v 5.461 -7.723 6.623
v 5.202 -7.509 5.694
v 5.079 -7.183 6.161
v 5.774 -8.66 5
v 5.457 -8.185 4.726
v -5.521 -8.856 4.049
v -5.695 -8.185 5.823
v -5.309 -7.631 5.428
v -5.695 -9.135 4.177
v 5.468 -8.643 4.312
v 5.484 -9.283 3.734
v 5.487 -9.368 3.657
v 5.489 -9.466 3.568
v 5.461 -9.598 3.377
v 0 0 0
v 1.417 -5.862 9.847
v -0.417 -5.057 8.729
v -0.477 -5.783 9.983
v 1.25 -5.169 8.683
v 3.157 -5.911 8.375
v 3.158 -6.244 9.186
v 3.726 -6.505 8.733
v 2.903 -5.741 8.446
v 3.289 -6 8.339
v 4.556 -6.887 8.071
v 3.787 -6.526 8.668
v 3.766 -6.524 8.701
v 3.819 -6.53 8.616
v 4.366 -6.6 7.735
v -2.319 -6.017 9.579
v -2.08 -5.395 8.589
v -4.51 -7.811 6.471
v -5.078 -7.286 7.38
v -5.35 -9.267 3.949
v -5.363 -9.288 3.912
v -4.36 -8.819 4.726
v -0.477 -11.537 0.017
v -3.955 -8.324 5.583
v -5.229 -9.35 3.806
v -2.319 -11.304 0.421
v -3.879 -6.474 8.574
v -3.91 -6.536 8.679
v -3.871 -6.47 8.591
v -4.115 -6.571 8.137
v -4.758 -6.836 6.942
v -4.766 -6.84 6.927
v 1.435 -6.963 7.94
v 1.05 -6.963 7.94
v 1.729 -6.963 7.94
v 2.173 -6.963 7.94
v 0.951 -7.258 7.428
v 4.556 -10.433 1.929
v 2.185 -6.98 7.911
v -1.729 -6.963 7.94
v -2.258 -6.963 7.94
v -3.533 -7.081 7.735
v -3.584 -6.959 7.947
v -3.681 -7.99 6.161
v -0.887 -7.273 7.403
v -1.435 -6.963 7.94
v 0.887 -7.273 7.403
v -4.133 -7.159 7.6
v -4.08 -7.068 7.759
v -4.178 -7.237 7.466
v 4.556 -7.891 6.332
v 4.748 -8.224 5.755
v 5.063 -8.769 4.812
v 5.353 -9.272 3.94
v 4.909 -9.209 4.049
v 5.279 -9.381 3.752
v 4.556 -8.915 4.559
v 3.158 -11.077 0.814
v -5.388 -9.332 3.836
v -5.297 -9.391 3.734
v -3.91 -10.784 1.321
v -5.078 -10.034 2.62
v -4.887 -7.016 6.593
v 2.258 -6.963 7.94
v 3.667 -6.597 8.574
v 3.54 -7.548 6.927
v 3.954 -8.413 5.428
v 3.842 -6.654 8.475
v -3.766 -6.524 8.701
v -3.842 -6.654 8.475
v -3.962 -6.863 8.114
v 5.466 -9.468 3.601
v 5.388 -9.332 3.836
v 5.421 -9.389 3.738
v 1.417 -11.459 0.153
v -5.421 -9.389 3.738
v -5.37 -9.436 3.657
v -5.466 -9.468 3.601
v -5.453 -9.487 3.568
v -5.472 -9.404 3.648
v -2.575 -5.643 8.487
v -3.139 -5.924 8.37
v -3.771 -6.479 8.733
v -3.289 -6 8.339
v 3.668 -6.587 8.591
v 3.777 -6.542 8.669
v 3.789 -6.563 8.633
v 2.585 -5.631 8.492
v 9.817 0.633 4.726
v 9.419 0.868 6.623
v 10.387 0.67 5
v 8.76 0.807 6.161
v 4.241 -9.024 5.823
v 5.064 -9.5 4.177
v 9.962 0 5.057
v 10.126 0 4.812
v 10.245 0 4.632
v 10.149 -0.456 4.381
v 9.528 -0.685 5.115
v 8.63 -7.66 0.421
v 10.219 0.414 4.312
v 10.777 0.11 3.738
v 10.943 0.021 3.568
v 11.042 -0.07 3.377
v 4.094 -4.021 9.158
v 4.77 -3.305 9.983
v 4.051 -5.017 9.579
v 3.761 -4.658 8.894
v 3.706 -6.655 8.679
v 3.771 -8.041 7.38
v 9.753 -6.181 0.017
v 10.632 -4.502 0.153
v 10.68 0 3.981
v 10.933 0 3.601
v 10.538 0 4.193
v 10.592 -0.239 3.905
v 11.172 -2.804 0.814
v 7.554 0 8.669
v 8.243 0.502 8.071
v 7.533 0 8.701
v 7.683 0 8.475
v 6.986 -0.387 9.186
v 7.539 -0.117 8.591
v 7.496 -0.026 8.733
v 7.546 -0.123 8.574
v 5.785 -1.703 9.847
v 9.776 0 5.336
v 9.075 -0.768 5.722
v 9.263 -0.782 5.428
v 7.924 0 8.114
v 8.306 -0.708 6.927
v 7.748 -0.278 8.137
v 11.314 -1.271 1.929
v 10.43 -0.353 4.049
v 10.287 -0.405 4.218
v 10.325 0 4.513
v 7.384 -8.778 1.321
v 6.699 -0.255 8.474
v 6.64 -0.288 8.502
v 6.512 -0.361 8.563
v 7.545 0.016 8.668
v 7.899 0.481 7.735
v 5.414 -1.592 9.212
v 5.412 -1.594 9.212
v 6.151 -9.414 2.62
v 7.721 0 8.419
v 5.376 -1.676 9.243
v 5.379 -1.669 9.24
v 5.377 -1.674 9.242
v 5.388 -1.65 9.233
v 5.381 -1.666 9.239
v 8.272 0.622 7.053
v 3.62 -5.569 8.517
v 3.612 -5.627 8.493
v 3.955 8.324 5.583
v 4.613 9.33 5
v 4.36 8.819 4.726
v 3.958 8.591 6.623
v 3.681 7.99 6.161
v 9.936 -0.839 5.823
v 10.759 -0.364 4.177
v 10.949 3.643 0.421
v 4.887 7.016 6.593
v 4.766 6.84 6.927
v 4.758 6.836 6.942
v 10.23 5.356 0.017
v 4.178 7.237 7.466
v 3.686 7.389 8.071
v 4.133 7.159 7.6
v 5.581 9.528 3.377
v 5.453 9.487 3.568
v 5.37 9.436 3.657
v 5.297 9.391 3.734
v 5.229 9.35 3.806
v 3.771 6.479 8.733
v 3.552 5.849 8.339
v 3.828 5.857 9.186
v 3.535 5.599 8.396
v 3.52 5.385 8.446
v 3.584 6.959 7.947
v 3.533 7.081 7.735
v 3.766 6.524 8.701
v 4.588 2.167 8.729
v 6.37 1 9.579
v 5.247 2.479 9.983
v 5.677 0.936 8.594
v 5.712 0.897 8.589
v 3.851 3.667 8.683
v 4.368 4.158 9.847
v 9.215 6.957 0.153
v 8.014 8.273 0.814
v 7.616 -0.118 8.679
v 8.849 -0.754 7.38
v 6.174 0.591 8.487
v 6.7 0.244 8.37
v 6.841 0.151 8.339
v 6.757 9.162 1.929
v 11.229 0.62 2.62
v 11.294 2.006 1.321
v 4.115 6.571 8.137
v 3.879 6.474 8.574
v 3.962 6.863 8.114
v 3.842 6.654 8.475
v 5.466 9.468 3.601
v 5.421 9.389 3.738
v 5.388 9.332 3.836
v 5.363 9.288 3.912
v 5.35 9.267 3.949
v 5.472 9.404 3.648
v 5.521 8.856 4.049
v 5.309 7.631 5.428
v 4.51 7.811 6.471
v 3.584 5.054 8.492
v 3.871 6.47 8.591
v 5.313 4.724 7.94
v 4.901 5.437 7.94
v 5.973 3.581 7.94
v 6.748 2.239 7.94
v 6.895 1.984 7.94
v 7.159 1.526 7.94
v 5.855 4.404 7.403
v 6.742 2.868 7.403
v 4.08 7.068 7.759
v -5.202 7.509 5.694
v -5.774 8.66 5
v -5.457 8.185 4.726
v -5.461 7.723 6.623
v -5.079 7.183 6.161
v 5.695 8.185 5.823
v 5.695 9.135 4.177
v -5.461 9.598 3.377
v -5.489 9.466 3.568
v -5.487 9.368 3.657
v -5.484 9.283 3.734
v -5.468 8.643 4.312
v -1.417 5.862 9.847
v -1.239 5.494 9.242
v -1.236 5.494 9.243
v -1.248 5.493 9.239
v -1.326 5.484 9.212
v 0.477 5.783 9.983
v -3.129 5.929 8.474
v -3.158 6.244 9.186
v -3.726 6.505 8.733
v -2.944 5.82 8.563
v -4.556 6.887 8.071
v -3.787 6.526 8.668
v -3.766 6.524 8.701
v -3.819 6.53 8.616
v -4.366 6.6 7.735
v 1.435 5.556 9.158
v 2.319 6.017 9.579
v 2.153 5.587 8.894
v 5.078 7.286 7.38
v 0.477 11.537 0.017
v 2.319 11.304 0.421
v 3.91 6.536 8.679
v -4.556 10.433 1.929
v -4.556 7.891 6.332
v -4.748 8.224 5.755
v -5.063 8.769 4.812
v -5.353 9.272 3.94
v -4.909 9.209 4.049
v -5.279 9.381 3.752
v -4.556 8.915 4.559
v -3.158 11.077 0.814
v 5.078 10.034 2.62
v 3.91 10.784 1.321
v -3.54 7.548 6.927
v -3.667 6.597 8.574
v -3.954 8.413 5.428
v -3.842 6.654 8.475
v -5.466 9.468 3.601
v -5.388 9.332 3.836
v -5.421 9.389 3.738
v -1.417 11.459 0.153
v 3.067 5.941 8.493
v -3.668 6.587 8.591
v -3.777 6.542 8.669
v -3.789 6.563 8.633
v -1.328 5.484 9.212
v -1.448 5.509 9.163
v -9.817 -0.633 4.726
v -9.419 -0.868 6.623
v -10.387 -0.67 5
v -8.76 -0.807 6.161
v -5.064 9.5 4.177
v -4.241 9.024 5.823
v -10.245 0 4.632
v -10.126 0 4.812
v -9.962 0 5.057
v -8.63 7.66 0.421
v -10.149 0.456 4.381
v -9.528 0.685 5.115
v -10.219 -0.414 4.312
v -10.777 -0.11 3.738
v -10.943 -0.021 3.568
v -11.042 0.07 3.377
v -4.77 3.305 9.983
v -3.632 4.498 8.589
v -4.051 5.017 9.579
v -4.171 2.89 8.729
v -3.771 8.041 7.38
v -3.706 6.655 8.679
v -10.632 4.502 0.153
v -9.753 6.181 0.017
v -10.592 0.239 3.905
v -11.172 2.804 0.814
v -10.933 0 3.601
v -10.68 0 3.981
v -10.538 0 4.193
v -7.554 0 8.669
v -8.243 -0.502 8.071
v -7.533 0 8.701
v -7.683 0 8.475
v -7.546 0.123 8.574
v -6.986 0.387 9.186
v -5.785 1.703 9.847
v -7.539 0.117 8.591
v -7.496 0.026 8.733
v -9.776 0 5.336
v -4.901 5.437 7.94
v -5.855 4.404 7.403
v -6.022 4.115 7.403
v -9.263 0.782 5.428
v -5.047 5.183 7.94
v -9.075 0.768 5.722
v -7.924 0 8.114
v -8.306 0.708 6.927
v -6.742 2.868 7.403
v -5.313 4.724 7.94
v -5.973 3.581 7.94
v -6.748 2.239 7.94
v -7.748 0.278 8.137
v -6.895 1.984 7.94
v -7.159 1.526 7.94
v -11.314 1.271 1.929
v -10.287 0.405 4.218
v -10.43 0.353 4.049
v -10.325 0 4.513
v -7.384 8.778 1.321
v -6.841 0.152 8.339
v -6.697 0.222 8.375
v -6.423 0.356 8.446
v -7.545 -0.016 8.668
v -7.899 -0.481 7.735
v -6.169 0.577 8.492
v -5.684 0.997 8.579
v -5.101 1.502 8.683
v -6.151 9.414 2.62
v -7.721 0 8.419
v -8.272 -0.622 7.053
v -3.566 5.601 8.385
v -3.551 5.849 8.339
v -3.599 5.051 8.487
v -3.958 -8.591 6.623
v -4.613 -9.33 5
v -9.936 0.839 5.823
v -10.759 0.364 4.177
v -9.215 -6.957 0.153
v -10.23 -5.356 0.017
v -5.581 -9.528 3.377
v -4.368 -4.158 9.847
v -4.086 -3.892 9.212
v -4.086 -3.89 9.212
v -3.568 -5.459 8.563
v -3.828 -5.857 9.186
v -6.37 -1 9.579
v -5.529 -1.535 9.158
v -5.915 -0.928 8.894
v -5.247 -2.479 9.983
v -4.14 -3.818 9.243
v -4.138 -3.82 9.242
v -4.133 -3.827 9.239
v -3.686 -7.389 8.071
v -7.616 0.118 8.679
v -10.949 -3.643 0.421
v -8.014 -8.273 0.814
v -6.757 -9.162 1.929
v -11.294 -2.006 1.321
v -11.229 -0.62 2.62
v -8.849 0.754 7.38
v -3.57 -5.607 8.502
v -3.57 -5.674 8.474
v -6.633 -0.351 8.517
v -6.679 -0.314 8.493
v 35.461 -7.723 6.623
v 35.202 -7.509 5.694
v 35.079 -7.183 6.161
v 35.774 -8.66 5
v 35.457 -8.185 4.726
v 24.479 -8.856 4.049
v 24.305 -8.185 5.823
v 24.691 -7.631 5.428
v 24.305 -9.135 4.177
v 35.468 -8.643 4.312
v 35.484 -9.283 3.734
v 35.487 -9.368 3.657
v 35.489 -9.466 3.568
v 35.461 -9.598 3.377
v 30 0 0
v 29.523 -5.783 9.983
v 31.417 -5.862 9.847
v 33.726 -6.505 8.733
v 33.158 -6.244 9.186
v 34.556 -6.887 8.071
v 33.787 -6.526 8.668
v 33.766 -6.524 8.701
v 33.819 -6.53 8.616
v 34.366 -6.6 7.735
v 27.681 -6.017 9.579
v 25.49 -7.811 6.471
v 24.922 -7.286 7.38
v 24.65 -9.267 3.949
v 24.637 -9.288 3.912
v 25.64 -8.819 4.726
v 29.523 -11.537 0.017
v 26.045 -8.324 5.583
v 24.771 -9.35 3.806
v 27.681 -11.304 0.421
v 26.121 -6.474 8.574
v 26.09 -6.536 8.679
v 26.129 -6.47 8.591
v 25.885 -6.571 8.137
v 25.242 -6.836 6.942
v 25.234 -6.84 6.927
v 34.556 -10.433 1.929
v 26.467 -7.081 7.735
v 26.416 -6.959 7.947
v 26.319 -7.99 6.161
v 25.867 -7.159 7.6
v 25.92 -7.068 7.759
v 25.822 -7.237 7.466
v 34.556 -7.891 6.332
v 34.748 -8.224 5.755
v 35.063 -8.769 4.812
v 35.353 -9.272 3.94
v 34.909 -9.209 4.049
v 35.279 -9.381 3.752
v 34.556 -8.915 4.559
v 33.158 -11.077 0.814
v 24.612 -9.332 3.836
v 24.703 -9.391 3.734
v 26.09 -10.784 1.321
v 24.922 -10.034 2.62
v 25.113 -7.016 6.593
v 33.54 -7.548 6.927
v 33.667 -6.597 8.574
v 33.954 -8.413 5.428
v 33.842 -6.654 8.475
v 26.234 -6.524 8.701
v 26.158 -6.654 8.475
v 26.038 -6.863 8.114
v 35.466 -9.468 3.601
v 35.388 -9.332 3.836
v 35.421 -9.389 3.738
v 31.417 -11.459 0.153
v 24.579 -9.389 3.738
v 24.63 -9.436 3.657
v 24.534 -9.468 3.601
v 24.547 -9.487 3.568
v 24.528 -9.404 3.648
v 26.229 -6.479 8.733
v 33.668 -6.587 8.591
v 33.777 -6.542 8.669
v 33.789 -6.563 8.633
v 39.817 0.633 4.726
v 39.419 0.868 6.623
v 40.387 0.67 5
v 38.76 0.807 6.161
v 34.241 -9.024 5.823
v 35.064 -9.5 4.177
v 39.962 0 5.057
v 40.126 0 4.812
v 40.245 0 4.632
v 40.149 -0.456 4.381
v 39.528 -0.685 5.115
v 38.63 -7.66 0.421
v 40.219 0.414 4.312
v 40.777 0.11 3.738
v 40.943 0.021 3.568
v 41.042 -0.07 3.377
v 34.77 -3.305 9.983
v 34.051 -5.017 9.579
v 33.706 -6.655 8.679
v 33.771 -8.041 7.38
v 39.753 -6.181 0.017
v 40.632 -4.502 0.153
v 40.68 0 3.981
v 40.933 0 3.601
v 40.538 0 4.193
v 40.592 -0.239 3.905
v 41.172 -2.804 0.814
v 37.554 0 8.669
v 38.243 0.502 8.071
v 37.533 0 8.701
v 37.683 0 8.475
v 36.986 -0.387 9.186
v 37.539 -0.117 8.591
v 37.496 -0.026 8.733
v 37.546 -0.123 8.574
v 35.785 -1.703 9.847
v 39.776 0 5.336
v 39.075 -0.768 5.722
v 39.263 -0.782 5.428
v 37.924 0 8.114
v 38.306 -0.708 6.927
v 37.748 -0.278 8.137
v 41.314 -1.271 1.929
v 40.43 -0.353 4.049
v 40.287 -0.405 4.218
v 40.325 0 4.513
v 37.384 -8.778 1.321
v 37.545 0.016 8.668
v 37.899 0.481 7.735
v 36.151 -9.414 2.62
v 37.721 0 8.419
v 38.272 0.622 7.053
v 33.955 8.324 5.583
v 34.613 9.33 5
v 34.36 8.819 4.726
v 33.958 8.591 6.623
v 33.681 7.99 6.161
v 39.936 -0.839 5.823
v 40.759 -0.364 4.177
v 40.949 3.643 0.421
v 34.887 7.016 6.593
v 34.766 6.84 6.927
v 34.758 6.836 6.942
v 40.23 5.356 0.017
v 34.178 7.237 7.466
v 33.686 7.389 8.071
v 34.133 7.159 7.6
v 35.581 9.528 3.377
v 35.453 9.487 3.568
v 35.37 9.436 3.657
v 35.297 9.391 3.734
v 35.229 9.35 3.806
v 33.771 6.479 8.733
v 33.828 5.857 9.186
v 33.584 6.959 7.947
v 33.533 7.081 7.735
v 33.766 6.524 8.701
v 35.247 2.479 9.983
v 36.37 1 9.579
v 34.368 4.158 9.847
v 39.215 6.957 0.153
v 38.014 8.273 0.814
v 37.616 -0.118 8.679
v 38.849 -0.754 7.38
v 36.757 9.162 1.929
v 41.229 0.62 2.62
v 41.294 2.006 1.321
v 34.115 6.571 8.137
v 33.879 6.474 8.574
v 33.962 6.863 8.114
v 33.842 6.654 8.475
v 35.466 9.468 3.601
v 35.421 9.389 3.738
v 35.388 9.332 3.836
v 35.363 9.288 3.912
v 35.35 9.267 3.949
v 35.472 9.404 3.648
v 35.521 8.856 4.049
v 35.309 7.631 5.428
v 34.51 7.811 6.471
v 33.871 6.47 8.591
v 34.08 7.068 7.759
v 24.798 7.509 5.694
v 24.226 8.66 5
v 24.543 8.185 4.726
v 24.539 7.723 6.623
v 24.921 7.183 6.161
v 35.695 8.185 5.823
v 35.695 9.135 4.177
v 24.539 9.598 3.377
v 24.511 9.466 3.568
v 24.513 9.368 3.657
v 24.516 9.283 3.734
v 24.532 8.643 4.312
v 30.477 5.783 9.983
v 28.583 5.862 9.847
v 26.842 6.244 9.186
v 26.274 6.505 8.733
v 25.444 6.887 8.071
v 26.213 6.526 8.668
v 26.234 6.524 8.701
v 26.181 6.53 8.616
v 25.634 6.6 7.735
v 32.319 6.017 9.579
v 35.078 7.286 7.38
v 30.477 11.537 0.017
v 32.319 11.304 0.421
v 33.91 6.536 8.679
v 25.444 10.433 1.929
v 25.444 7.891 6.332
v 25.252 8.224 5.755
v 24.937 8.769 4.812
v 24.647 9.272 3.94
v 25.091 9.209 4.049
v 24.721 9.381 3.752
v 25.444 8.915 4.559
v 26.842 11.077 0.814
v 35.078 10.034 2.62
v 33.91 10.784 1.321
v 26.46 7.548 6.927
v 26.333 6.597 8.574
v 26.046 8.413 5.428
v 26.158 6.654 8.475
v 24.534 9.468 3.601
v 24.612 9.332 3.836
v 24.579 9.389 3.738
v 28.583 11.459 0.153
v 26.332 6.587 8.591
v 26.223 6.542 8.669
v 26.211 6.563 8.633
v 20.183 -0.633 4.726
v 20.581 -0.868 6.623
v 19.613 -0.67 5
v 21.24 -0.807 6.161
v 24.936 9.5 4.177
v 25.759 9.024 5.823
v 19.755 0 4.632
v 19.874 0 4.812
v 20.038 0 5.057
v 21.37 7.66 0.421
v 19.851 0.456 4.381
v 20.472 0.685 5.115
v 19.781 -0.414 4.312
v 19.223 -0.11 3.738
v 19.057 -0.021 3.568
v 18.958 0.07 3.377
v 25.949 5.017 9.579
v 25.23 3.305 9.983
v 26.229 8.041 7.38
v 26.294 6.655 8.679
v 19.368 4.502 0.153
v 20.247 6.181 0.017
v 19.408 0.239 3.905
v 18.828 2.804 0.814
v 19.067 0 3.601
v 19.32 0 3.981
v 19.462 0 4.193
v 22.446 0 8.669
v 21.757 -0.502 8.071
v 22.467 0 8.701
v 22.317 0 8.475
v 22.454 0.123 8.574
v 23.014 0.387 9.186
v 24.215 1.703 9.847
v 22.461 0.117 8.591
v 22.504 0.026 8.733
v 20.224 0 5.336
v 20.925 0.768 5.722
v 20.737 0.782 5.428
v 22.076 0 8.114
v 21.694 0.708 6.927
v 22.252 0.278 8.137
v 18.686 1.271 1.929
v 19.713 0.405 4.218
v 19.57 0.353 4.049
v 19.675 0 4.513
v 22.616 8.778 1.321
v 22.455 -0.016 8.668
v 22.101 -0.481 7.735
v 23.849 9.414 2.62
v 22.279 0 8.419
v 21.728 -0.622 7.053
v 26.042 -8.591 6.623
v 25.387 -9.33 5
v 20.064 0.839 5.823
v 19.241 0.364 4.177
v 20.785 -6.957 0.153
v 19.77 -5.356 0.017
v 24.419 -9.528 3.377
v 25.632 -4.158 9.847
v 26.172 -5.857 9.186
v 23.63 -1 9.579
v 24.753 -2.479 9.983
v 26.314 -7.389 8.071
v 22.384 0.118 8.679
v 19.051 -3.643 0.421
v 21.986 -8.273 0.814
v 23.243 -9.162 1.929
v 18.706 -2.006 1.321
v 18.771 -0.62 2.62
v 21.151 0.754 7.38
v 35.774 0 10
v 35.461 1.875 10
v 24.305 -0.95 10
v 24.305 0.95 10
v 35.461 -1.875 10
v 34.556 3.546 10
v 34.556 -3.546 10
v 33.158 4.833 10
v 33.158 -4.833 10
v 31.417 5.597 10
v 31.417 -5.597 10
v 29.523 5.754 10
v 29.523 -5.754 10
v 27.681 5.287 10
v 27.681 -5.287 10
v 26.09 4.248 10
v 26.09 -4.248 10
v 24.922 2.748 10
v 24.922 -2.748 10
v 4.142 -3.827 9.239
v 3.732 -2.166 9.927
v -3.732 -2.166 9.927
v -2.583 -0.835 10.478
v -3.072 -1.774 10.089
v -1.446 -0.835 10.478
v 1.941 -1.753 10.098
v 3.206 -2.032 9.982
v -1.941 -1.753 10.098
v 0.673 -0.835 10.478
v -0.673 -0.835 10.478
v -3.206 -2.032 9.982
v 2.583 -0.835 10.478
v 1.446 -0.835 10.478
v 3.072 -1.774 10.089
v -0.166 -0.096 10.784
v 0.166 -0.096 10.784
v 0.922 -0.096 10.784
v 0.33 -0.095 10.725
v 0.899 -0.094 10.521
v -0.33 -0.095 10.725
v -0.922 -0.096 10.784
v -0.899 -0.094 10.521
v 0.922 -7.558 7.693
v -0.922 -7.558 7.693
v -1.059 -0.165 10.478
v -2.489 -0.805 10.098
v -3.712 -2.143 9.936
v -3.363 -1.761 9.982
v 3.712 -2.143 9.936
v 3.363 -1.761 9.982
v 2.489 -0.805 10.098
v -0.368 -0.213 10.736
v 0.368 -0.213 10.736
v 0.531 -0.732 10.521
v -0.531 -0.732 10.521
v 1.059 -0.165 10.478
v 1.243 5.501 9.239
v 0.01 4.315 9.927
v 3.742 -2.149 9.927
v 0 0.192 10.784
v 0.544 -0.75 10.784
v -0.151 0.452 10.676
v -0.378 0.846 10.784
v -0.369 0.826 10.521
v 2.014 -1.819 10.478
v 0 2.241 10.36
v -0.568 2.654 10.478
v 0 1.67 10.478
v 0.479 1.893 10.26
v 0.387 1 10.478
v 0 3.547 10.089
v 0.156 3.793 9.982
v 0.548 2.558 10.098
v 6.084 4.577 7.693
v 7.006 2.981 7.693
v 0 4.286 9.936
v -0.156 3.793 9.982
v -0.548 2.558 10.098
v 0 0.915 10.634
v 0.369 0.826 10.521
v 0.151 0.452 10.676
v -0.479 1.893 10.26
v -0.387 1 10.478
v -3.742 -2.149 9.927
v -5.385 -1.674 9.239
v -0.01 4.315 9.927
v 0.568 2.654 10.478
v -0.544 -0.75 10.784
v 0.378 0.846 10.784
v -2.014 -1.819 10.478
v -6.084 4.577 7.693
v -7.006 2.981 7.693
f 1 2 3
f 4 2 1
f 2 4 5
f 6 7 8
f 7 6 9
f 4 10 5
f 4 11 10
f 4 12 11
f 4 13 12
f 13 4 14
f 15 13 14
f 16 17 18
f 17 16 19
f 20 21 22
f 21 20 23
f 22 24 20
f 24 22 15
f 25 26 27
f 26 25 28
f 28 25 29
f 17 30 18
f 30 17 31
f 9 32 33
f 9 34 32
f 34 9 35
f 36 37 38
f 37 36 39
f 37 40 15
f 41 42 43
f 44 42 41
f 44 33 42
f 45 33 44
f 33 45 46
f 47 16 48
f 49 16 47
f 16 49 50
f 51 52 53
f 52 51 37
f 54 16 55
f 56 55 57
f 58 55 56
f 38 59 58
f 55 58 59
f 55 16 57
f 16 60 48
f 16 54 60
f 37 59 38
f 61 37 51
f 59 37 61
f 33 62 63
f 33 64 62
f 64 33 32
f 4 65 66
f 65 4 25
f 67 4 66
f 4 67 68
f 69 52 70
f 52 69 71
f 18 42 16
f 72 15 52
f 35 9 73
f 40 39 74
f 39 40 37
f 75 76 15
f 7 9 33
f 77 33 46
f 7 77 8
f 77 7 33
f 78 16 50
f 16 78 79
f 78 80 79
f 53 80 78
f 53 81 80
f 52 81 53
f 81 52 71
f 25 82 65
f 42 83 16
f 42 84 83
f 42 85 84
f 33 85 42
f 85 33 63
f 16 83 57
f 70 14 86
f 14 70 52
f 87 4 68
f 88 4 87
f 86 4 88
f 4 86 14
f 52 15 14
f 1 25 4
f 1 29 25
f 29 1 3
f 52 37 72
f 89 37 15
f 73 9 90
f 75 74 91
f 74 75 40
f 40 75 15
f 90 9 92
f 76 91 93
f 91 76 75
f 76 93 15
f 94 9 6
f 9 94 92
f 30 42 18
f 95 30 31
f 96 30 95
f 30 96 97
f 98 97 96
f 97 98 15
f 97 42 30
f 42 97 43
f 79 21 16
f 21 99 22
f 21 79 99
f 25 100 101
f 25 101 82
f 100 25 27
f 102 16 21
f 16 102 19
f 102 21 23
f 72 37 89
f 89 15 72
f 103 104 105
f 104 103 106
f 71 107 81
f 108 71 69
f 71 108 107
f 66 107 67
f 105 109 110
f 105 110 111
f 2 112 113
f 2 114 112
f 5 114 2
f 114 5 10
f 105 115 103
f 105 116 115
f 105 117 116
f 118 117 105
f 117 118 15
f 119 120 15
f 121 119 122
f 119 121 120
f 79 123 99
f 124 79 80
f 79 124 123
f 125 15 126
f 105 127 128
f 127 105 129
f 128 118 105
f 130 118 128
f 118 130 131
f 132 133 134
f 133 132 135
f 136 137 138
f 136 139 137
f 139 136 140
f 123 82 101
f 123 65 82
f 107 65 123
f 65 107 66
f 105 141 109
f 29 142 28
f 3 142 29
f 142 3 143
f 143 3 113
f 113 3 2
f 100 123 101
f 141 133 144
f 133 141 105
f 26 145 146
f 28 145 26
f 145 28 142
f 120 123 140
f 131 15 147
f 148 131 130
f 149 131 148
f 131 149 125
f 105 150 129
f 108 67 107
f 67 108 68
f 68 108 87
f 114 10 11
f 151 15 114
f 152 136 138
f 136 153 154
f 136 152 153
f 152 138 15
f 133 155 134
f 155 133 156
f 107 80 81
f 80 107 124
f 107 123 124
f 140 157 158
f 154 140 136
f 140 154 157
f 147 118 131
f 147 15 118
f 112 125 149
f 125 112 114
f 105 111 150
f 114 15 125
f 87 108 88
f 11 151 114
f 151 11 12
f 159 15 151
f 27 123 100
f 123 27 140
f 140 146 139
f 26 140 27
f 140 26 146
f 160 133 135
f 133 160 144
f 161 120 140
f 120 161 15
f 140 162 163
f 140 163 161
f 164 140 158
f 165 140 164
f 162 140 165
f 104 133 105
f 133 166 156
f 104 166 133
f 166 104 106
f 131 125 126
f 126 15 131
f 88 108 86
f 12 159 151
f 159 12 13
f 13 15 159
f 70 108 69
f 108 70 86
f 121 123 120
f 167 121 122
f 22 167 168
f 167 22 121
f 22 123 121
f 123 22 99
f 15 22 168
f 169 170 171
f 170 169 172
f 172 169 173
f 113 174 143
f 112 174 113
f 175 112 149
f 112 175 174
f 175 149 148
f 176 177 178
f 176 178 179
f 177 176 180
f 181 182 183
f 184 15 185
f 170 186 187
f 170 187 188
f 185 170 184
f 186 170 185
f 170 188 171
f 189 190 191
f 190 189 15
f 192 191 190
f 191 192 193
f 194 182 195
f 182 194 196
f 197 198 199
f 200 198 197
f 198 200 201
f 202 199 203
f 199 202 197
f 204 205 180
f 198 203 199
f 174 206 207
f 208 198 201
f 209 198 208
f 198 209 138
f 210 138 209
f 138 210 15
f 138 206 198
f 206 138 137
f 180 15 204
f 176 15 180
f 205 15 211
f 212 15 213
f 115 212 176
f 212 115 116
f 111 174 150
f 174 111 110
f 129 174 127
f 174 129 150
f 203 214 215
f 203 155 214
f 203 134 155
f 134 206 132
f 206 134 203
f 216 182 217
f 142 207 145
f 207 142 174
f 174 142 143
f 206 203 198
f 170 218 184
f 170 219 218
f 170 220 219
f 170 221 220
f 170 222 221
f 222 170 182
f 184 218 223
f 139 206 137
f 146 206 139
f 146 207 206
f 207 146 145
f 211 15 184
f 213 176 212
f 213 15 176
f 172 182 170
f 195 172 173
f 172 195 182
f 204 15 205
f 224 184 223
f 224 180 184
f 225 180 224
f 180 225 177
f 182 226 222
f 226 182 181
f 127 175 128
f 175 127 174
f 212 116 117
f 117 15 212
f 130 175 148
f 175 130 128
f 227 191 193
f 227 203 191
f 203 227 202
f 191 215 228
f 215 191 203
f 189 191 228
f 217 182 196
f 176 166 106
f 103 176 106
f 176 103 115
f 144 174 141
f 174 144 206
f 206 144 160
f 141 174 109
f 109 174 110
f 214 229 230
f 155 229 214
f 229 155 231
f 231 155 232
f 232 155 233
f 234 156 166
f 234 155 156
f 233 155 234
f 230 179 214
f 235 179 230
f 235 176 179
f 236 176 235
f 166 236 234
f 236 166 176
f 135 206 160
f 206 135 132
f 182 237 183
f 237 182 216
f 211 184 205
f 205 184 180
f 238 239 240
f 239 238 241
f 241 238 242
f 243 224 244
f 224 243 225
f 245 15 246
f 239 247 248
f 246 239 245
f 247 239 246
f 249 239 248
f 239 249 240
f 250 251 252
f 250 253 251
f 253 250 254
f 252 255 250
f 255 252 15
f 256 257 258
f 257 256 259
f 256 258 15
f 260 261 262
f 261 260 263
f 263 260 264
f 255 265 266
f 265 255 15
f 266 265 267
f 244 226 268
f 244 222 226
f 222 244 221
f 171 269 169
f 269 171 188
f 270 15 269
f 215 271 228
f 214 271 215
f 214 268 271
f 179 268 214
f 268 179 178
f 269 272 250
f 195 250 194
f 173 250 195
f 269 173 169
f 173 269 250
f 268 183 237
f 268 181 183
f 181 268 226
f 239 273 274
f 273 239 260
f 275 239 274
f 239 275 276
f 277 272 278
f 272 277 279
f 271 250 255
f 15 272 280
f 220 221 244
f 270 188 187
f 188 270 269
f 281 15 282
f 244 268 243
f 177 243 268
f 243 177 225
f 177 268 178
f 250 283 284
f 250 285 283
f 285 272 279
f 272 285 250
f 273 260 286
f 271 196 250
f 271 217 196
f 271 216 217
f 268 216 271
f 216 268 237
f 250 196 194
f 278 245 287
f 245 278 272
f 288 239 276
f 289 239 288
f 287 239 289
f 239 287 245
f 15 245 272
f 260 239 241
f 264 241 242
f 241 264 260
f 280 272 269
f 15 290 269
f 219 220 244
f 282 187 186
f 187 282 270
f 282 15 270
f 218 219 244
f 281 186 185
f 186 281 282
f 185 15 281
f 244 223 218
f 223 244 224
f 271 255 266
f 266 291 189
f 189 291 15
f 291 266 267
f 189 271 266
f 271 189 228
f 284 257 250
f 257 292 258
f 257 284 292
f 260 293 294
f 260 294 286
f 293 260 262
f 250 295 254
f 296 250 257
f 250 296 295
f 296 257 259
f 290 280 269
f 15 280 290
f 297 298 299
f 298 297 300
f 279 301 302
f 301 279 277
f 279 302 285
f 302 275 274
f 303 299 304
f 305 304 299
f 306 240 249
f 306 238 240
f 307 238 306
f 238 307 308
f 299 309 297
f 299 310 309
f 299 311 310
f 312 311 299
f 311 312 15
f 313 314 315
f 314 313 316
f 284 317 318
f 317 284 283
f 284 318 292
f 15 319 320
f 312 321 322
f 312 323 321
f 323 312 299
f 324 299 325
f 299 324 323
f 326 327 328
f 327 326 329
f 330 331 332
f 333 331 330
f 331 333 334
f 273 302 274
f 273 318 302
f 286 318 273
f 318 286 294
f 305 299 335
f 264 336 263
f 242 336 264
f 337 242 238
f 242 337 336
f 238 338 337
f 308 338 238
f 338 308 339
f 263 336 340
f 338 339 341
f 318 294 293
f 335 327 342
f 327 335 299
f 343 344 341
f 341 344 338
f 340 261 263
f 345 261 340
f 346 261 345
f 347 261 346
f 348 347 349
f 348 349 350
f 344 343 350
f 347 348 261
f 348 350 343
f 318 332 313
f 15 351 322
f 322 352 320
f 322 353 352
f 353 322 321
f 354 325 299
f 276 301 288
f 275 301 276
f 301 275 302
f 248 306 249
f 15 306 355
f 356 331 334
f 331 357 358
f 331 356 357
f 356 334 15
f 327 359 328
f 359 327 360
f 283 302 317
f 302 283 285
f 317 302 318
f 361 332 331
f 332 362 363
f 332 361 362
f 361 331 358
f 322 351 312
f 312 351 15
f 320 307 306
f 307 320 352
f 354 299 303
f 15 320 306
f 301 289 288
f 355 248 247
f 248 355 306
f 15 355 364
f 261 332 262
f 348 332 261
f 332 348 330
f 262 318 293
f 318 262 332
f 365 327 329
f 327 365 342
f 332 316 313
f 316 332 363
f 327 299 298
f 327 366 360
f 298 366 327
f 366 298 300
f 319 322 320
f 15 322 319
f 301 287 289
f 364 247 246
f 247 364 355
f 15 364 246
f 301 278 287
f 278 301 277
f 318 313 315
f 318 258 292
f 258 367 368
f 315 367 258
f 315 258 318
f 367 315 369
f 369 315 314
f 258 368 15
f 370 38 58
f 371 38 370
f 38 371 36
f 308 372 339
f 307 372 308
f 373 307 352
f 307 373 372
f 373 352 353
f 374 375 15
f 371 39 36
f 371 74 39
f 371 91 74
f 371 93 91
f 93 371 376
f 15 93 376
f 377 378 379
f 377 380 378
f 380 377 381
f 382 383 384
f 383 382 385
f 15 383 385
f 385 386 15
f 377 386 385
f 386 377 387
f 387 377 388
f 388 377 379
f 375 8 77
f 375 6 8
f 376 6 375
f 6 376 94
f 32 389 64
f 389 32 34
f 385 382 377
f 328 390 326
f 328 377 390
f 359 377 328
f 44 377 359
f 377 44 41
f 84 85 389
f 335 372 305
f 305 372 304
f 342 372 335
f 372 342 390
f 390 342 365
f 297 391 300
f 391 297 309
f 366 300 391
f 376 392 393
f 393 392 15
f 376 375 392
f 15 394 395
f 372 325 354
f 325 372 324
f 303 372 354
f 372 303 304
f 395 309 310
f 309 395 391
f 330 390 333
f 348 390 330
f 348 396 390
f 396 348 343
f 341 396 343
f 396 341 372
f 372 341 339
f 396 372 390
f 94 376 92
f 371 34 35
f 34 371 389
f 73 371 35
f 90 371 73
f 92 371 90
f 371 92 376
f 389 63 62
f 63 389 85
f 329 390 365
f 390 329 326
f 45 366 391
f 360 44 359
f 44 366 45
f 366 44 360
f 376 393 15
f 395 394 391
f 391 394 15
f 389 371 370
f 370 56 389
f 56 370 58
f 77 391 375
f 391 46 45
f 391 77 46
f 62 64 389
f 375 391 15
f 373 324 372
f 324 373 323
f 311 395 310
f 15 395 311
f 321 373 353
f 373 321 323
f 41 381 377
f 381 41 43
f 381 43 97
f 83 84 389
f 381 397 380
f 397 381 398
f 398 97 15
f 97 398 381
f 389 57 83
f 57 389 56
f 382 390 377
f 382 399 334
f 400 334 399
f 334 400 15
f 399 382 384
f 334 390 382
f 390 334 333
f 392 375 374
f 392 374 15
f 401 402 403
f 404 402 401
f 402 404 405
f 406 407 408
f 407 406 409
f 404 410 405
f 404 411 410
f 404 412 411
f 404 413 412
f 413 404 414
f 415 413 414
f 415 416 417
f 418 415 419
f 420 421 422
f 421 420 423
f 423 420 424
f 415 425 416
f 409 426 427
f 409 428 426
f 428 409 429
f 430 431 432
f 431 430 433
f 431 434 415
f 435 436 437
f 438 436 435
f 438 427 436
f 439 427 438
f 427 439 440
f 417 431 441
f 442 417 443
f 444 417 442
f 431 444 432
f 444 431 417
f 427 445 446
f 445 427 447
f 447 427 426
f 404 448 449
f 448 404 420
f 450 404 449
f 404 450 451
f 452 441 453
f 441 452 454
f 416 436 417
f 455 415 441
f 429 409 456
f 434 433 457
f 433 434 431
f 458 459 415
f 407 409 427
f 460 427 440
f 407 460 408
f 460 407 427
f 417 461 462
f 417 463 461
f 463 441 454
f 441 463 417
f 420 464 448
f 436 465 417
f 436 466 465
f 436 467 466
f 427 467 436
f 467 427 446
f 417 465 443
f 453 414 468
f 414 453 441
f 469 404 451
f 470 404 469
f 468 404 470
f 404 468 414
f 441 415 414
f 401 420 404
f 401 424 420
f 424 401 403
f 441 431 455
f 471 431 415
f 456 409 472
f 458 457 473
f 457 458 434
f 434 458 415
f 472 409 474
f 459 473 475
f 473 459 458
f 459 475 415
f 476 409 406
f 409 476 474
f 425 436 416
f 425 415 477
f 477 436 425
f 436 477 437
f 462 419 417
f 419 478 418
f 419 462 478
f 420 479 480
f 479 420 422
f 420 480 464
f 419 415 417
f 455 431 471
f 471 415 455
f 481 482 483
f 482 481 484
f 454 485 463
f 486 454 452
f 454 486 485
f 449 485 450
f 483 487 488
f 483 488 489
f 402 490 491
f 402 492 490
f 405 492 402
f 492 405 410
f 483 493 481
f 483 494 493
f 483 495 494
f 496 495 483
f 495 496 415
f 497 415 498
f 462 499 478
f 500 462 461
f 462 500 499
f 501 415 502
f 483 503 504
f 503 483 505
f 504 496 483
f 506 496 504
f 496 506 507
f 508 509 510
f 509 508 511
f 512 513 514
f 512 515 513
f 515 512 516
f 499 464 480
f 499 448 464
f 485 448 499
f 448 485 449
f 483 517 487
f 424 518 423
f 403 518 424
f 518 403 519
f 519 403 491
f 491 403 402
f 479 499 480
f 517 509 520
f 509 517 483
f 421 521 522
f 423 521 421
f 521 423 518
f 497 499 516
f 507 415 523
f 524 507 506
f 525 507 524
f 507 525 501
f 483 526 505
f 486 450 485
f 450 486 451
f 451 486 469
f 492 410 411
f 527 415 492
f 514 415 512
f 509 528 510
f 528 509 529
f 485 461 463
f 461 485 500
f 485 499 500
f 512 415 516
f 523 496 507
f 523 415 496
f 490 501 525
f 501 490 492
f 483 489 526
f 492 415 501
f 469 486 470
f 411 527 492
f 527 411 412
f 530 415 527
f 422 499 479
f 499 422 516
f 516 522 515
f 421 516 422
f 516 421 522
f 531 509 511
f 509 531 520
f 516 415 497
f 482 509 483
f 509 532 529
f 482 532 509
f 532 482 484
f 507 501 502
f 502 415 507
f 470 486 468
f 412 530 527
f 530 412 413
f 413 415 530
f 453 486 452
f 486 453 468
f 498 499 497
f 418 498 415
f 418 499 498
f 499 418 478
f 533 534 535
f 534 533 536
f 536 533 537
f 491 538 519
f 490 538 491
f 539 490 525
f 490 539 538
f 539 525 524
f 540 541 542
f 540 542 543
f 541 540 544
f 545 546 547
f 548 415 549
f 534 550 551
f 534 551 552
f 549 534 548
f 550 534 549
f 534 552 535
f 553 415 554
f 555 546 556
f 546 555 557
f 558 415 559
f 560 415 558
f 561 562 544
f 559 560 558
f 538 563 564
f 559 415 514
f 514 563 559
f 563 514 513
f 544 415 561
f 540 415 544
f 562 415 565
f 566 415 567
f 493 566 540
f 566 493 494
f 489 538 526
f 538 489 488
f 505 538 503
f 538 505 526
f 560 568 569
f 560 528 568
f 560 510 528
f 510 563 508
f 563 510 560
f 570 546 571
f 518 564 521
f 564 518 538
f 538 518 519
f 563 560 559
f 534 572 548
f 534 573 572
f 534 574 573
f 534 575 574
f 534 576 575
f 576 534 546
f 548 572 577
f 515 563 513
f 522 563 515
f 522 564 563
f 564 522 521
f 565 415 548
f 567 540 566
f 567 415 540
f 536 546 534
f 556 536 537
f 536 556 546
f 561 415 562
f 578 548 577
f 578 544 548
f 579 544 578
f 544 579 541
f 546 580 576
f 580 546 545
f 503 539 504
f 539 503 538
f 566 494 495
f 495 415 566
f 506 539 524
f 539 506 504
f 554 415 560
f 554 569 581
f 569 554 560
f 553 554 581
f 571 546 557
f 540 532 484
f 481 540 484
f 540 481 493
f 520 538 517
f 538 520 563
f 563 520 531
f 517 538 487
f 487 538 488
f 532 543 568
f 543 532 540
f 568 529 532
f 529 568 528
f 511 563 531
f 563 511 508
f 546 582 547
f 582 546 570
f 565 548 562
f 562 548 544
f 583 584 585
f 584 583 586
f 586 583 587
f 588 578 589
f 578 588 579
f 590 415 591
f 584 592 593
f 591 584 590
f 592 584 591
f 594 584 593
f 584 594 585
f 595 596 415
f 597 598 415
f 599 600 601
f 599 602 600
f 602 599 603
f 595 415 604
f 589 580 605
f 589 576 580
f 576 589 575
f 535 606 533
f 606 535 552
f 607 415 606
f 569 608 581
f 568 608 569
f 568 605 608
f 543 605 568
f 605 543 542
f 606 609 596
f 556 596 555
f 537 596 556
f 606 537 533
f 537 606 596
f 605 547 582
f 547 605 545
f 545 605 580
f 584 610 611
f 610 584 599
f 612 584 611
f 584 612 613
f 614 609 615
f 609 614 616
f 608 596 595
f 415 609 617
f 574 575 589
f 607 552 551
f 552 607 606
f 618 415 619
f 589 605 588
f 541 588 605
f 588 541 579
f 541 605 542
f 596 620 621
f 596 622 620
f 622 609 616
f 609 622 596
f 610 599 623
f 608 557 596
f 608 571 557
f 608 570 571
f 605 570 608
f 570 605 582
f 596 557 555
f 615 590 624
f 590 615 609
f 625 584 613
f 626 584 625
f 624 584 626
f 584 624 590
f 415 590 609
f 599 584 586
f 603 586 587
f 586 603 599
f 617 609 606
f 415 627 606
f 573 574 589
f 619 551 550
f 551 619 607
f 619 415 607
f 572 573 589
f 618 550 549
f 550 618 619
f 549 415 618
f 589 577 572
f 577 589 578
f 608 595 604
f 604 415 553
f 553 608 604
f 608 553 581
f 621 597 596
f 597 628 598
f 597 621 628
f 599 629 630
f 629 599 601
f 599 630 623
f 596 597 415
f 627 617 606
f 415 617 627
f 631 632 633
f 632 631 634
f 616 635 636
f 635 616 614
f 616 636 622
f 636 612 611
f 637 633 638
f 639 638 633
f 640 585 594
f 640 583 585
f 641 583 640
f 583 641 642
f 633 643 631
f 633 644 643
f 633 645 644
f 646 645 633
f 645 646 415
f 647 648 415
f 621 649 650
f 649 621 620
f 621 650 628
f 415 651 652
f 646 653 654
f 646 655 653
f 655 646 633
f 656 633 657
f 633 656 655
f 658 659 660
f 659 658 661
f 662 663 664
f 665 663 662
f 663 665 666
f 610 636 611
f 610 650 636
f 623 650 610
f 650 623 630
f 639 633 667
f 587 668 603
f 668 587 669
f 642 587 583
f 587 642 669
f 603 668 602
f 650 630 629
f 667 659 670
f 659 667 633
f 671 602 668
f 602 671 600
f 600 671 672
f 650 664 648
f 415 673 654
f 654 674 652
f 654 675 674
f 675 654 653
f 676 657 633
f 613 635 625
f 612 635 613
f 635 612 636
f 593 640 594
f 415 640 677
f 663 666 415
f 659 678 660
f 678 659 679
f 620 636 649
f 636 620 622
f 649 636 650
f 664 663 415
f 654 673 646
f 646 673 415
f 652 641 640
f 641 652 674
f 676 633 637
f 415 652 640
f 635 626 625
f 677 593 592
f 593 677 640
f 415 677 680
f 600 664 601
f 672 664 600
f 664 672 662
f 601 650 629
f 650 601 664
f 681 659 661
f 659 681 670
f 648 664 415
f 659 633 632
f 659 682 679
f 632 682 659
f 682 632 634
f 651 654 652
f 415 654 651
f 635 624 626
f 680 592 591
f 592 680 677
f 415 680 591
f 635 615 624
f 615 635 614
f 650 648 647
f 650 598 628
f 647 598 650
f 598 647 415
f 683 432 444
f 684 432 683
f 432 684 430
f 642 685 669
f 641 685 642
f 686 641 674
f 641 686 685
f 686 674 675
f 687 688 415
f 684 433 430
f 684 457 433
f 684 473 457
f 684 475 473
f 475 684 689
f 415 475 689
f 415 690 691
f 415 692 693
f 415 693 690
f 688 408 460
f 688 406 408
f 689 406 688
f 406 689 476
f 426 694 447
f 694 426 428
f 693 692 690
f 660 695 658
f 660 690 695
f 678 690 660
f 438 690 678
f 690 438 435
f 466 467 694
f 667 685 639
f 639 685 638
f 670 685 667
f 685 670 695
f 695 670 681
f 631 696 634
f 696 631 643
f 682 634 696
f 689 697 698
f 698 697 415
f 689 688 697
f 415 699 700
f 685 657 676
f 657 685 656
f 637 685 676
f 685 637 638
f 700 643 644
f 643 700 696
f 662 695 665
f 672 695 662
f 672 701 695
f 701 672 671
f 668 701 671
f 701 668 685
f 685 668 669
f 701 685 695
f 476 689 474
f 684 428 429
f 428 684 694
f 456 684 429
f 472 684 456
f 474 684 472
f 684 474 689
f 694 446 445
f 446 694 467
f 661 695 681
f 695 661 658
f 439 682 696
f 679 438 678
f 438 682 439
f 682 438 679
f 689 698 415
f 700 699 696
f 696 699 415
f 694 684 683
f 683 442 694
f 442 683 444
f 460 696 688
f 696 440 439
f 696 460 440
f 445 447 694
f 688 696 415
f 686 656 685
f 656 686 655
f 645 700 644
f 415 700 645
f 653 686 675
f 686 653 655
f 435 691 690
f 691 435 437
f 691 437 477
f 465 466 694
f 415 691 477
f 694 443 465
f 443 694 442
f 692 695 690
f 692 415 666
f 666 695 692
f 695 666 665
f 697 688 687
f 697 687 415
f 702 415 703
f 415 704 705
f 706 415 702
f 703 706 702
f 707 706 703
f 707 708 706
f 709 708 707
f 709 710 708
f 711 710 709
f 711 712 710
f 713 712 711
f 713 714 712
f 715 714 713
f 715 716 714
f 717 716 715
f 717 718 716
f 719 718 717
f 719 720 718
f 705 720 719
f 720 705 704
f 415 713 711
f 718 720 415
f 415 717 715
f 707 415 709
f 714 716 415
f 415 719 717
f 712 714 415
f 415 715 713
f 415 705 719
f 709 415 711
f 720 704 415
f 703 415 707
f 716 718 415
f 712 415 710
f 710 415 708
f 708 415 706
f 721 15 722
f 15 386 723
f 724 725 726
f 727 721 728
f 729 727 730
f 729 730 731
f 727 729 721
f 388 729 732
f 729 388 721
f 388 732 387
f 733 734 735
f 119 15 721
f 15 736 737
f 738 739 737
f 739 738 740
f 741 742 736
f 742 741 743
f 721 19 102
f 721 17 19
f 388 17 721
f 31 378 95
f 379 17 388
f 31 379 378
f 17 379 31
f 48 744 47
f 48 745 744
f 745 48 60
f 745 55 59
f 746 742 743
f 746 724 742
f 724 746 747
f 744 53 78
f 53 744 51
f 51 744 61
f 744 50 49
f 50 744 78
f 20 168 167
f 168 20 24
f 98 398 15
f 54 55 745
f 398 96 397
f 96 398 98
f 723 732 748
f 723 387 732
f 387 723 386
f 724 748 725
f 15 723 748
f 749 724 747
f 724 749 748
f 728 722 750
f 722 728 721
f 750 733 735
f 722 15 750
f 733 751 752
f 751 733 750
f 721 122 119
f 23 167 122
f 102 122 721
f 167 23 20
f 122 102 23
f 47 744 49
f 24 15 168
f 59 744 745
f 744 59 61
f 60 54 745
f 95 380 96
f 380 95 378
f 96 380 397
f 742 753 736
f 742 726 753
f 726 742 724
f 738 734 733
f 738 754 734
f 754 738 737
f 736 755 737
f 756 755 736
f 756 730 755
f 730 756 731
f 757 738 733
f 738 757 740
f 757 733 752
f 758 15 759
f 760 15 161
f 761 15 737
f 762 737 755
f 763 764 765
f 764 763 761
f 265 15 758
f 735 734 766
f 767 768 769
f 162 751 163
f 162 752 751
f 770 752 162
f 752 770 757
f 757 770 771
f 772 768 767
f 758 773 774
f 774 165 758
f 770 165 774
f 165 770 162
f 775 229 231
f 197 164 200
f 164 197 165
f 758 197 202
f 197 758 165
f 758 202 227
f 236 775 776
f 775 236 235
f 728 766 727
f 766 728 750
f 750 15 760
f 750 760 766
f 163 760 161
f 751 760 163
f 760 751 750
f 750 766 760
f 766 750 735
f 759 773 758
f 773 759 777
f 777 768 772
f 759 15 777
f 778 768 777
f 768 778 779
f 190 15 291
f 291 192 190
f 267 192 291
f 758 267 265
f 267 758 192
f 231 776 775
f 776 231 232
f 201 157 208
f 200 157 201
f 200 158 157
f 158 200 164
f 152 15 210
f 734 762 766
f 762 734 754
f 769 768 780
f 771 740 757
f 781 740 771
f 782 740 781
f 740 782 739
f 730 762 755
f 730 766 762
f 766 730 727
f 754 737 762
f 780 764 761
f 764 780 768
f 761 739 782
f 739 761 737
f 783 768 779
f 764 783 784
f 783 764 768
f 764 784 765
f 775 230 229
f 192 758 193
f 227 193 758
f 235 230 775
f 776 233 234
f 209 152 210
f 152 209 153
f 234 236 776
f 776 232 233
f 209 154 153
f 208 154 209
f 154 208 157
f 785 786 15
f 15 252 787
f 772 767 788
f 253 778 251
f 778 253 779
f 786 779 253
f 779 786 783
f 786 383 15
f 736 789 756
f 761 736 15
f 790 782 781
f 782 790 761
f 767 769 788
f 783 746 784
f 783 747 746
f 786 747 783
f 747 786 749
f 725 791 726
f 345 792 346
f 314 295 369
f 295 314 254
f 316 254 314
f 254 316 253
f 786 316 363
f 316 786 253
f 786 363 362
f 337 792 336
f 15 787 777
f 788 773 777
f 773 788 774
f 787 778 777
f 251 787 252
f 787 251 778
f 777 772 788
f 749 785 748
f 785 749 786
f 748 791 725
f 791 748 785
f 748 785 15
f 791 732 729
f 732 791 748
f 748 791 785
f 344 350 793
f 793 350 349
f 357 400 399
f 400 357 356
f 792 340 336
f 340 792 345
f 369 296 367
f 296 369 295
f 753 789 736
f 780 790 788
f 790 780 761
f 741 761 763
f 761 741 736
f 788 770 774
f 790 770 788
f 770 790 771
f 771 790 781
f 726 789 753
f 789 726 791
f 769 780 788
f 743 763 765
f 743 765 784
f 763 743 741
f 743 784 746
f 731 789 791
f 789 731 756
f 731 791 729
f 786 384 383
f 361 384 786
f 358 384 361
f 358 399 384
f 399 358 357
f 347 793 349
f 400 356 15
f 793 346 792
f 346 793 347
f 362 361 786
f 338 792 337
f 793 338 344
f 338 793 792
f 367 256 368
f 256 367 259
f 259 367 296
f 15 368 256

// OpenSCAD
module cone(openingAngle, length)
{
  translate([0, 0, length/2])
  cylinder(length, r1=0, r2=tan(openingAngle/2)*length,center=true);
}


module ConeArrangement6(l=10)
{

angle = 60;
l = 10;


cone(angle, l);

for(i=[0:5])
{
rotate([0, 0, 60*i])
rotate([90-angle/2, 0, 0])
cone(angle, l);
}

}


module ConeArrangement9(l=10)
{
angle1 = 45;
l1 = l;

for(i=[0:2])
{
rotate([0, 0, 120*i])
rotate([angle1/2, 0, 0])
cone(angle1, l1);
}

angle2 = 60;
l2 = l;

for(i=[0:5])
{
rotate([0, 0, 60*i])
rotate([90-angle2/2, 0, 0])
cone(angle2, l2);
}
}


translate([30, 0, 0])
ConeArrangement6();
ConeArrangement9();
